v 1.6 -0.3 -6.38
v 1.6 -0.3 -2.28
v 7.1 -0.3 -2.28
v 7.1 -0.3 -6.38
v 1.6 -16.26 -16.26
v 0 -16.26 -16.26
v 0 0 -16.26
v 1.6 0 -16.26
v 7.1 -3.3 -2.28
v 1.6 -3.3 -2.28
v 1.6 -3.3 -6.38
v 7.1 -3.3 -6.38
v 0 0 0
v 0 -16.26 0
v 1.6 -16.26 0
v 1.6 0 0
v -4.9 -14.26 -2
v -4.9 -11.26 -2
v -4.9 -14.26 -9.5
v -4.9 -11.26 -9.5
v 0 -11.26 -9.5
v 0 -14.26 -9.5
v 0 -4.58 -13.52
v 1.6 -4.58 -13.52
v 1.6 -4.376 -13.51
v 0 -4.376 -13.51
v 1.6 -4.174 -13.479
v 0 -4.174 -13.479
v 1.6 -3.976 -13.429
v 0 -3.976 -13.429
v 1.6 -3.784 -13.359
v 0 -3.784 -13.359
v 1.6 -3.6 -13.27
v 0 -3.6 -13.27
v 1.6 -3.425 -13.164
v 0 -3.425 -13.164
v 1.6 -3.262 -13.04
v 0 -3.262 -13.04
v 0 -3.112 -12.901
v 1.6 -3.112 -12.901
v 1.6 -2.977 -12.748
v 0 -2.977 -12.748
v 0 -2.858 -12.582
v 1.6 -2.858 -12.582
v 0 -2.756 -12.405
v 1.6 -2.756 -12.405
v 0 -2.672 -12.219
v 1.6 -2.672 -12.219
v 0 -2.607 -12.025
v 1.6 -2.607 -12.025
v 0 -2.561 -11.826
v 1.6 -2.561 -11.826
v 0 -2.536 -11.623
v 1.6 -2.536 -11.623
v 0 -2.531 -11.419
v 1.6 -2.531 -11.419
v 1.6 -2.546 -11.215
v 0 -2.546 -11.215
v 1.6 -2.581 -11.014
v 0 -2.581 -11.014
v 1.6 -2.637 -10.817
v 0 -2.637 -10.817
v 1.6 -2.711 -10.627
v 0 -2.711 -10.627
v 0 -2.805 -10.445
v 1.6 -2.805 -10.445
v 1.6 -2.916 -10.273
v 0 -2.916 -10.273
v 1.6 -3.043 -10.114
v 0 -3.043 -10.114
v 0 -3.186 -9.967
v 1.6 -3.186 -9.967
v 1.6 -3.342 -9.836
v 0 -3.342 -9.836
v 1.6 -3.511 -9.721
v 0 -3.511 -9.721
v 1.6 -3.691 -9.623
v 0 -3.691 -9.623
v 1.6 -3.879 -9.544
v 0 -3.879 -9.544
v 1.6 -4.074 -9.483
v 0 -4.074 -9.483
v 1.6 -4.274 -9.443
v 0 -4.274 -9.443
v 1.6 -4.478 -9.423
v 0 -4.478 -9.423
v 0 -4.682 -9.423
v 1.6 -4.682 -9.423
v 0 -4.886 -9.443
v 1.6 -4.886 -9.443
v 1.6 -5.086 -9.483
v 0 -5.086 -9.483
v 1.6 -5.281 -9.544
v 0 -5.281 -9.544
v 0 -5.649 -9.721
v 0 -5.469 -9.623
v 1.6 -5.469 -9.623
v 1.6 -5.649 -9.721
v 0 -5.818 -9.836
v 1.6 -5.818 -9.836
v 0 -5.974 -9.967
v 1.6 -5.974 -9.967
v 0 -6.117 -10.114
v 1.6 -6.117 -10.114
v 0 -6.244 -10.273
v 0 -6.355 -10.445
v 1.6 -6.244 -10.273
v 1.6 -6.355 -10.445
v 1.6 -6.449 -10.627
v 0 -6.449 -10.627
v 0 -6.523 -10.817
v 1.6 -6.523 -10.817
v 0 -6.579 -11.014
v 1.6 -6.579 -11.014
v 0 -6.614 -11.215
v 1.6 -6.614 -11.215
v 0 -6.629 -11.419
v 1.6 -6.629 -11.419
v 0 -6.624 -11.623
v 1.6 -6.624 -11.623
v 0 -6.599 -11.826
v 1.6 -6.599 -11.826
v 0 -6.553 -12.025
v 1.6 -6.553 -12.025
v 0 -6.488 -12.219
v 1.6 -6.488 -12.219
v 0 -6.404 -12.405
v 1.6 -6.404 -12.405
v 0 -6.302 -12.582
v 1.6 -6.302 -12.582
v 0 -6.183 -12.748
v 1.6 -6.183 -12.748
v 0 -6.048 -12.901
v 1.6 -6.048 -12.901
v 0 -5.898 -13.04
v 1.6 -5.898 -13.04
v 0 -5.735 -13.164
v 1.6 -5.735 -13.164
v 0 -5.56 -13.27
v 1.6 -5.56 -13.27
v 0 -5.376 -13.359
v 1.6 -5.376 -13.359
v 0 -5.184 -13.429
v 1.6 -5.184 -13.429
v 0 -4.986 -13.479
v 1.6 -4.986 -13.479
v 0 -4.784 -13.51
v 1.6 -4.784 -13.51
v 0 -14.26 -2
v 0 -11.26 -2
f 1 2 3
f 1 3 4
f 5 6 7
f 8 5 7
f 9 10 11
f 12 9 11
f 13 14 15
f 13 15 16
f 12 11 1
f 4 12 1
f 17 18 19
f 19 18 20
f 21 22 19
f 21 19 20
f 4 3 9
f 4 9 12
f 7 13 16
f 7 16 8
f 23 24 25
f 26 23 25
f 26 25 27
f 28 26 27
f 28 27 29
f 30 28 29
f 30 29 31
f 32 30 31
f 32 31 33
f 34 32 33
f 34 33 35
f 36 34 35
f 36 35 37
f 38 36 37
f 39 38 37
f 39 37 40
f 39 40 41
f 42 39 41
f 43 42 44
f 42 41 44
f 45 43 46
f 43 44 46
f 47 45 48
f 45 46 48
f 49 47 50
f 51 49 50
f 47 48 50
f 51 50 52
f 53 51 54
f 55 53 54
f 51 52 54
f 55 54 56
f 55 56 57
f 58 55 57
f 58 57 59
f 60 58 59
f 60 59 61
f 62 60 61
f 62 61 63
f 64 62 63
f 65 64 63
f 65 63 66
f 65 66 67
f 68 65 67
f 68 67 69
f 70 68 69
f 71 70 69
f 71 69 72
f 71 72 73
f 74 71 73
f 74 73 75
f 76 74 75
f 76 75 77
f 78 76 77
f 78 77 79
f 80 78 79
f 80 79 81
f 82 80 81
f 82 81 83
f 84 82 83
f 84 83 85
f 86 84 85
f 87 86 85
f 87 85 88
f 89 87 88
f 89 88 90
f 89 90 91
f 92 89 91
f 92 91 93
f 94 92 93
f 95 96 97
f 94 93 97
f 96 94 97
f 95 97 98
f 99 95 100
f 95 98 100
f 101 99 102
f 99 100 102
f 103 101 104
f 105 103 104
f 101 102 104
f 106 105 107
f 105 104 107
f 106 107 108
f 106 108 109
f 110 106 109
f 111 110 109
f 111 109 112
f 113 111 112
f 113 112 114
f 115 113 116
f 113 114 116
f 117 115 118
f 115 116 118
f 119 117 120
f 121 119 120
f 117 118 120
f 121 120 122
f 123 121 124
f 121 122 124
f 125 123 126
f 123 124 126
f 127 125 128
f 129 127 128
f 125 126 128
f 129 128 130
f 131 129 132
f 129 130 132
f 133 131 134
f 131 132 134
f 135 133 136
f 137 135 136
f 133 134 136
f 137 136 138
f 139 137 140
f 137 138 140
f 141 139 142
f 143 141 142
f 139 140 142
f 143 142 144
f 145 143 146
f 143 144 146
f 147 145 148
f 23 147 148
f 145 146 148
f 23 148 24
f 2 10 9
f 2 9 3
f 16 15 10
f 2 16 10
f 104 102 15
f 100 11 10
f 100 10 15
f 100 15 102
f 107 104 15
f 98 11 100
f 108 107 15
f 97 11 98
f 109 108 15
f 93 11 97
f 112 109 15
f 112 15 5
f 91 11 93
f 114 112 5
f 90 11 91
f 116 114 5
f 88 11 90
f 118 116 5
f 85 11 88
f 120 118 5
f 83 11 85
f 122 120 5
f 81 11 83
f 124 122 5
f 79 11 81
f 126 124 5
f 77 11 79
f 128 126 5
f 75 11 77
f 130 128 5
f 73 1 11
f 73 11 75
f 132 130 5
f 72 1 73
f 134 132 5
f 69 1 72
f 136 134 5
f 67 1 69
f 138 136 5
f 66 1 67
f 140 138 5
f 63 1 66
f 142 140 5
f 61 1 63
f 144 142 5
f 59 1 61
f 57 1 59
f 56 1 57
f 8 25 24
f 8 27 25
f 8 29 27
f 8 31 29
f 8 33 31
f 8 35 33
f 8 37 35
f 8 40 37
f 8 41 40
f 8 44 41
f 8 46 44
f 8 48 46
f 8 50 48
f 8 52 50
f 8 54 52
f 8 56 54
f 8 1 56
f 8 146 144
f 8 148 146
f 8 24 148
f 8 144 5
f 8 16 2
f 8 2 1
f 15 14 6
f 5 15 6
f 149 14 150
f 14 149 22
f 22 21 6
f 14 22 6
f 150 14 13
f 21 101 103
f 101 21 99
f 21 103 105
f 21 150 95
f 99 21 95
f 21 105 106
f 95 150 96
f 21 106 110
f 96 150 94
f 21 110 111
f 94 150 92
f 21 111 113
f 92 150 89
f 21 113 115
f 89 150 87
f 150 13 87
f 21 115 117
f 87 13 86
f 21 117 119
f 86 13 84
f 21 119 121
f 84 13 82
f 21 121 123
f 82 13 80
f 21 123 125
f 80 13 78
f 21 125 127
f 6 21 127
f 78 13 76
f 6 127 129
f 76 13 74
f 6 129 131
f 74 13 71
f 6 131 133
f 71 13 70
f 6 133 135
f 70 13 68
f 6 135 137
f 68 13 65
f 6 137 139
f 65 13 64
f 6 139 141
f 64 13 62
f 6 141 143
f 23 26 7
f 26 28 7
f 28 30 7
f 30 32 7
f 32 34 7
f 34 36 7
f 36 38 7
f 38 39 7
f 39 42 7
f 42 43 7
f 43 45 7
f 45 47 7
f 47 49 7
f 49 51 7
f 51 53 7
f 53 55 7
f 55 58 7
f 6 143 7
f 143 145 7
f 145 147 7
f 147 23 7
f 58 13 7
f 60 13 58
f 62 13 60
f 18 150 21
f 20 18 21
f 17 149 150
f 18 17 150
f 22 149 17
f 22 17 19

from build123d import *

# Parameters (mm, degrees)
SKETCH1_W           = 16.26
SKETCH1_H           = 16.26
BOSS_EXTRUDE1_DEPTH = 1.6
SKETCH1_3_W         = 4.1
SKETCH1_3_H         = 3
BOSS_EXTRUDE2_DEPTH = 7.1
SKETCH2_R           = 2.05
CUT_EXTRUDE1_DEPTH  = 24.643713752
SKETCH3_W           = 7.5
SKETCH3_H           = 3
BOSS_EXTRUDE3_DEPTH = 6.5


with BuildPart() as part:
    # Sketch1 → Boss-Extrude1 (new body)
    with BuildSketch(Plane(origin=(0, 0, 0), x_dir=(0, 0, -1), z_dir=(1, 0, 0))):
        with Locations((8.13, -8.13)):
            Rectangle(SKETCH1_W, SKETCH1_H)
    extrude(amount=BOSS_EXTRUDE1_DEPTH)

    # Sketch1<3> → Boss-Extrude2 (add)
    with BuildSketch(Plane(origin=(0, 0, 0), x_dir=(0, 0, -1), z_dir=(1, 0, 0))):
        with Locations((4.33, -1.8)):
            Rectangle(SKETCH1_3_W, SKETCH1_3_H)
    extrude(amount=BOSS_EXTRUDE2_DEPTH)

    # Sketch2 → Cut-Extrude1 (cut, through all)
    with BuildSketch(Plane(origin=(1.6, 0, 0), x_dir=(0, 0, -1), z_dir=(1, 0, 0))):
        with Locations((11.47, -4.58)):
            Circle(SKETCH2_R)
    extrude(amount=-CUT_EXTRUDE1_DEPTH, mode=Mode.SUBTRACT)

    # Sketch3 → Boss-Extrude3 (add)
    with BuildSketch(Plane(origin=(1.6, 0, 0), x_dir=(0, 0, -1), z_dir=(1, 0, 0))):
        with Locations((5.75, -12.76)):
            Rectangle(SKETCH3_W, SKETCH3_H)
    extrude(amount=-BOSS_EXTRUDE3_DEPTH)


solid = part.part
